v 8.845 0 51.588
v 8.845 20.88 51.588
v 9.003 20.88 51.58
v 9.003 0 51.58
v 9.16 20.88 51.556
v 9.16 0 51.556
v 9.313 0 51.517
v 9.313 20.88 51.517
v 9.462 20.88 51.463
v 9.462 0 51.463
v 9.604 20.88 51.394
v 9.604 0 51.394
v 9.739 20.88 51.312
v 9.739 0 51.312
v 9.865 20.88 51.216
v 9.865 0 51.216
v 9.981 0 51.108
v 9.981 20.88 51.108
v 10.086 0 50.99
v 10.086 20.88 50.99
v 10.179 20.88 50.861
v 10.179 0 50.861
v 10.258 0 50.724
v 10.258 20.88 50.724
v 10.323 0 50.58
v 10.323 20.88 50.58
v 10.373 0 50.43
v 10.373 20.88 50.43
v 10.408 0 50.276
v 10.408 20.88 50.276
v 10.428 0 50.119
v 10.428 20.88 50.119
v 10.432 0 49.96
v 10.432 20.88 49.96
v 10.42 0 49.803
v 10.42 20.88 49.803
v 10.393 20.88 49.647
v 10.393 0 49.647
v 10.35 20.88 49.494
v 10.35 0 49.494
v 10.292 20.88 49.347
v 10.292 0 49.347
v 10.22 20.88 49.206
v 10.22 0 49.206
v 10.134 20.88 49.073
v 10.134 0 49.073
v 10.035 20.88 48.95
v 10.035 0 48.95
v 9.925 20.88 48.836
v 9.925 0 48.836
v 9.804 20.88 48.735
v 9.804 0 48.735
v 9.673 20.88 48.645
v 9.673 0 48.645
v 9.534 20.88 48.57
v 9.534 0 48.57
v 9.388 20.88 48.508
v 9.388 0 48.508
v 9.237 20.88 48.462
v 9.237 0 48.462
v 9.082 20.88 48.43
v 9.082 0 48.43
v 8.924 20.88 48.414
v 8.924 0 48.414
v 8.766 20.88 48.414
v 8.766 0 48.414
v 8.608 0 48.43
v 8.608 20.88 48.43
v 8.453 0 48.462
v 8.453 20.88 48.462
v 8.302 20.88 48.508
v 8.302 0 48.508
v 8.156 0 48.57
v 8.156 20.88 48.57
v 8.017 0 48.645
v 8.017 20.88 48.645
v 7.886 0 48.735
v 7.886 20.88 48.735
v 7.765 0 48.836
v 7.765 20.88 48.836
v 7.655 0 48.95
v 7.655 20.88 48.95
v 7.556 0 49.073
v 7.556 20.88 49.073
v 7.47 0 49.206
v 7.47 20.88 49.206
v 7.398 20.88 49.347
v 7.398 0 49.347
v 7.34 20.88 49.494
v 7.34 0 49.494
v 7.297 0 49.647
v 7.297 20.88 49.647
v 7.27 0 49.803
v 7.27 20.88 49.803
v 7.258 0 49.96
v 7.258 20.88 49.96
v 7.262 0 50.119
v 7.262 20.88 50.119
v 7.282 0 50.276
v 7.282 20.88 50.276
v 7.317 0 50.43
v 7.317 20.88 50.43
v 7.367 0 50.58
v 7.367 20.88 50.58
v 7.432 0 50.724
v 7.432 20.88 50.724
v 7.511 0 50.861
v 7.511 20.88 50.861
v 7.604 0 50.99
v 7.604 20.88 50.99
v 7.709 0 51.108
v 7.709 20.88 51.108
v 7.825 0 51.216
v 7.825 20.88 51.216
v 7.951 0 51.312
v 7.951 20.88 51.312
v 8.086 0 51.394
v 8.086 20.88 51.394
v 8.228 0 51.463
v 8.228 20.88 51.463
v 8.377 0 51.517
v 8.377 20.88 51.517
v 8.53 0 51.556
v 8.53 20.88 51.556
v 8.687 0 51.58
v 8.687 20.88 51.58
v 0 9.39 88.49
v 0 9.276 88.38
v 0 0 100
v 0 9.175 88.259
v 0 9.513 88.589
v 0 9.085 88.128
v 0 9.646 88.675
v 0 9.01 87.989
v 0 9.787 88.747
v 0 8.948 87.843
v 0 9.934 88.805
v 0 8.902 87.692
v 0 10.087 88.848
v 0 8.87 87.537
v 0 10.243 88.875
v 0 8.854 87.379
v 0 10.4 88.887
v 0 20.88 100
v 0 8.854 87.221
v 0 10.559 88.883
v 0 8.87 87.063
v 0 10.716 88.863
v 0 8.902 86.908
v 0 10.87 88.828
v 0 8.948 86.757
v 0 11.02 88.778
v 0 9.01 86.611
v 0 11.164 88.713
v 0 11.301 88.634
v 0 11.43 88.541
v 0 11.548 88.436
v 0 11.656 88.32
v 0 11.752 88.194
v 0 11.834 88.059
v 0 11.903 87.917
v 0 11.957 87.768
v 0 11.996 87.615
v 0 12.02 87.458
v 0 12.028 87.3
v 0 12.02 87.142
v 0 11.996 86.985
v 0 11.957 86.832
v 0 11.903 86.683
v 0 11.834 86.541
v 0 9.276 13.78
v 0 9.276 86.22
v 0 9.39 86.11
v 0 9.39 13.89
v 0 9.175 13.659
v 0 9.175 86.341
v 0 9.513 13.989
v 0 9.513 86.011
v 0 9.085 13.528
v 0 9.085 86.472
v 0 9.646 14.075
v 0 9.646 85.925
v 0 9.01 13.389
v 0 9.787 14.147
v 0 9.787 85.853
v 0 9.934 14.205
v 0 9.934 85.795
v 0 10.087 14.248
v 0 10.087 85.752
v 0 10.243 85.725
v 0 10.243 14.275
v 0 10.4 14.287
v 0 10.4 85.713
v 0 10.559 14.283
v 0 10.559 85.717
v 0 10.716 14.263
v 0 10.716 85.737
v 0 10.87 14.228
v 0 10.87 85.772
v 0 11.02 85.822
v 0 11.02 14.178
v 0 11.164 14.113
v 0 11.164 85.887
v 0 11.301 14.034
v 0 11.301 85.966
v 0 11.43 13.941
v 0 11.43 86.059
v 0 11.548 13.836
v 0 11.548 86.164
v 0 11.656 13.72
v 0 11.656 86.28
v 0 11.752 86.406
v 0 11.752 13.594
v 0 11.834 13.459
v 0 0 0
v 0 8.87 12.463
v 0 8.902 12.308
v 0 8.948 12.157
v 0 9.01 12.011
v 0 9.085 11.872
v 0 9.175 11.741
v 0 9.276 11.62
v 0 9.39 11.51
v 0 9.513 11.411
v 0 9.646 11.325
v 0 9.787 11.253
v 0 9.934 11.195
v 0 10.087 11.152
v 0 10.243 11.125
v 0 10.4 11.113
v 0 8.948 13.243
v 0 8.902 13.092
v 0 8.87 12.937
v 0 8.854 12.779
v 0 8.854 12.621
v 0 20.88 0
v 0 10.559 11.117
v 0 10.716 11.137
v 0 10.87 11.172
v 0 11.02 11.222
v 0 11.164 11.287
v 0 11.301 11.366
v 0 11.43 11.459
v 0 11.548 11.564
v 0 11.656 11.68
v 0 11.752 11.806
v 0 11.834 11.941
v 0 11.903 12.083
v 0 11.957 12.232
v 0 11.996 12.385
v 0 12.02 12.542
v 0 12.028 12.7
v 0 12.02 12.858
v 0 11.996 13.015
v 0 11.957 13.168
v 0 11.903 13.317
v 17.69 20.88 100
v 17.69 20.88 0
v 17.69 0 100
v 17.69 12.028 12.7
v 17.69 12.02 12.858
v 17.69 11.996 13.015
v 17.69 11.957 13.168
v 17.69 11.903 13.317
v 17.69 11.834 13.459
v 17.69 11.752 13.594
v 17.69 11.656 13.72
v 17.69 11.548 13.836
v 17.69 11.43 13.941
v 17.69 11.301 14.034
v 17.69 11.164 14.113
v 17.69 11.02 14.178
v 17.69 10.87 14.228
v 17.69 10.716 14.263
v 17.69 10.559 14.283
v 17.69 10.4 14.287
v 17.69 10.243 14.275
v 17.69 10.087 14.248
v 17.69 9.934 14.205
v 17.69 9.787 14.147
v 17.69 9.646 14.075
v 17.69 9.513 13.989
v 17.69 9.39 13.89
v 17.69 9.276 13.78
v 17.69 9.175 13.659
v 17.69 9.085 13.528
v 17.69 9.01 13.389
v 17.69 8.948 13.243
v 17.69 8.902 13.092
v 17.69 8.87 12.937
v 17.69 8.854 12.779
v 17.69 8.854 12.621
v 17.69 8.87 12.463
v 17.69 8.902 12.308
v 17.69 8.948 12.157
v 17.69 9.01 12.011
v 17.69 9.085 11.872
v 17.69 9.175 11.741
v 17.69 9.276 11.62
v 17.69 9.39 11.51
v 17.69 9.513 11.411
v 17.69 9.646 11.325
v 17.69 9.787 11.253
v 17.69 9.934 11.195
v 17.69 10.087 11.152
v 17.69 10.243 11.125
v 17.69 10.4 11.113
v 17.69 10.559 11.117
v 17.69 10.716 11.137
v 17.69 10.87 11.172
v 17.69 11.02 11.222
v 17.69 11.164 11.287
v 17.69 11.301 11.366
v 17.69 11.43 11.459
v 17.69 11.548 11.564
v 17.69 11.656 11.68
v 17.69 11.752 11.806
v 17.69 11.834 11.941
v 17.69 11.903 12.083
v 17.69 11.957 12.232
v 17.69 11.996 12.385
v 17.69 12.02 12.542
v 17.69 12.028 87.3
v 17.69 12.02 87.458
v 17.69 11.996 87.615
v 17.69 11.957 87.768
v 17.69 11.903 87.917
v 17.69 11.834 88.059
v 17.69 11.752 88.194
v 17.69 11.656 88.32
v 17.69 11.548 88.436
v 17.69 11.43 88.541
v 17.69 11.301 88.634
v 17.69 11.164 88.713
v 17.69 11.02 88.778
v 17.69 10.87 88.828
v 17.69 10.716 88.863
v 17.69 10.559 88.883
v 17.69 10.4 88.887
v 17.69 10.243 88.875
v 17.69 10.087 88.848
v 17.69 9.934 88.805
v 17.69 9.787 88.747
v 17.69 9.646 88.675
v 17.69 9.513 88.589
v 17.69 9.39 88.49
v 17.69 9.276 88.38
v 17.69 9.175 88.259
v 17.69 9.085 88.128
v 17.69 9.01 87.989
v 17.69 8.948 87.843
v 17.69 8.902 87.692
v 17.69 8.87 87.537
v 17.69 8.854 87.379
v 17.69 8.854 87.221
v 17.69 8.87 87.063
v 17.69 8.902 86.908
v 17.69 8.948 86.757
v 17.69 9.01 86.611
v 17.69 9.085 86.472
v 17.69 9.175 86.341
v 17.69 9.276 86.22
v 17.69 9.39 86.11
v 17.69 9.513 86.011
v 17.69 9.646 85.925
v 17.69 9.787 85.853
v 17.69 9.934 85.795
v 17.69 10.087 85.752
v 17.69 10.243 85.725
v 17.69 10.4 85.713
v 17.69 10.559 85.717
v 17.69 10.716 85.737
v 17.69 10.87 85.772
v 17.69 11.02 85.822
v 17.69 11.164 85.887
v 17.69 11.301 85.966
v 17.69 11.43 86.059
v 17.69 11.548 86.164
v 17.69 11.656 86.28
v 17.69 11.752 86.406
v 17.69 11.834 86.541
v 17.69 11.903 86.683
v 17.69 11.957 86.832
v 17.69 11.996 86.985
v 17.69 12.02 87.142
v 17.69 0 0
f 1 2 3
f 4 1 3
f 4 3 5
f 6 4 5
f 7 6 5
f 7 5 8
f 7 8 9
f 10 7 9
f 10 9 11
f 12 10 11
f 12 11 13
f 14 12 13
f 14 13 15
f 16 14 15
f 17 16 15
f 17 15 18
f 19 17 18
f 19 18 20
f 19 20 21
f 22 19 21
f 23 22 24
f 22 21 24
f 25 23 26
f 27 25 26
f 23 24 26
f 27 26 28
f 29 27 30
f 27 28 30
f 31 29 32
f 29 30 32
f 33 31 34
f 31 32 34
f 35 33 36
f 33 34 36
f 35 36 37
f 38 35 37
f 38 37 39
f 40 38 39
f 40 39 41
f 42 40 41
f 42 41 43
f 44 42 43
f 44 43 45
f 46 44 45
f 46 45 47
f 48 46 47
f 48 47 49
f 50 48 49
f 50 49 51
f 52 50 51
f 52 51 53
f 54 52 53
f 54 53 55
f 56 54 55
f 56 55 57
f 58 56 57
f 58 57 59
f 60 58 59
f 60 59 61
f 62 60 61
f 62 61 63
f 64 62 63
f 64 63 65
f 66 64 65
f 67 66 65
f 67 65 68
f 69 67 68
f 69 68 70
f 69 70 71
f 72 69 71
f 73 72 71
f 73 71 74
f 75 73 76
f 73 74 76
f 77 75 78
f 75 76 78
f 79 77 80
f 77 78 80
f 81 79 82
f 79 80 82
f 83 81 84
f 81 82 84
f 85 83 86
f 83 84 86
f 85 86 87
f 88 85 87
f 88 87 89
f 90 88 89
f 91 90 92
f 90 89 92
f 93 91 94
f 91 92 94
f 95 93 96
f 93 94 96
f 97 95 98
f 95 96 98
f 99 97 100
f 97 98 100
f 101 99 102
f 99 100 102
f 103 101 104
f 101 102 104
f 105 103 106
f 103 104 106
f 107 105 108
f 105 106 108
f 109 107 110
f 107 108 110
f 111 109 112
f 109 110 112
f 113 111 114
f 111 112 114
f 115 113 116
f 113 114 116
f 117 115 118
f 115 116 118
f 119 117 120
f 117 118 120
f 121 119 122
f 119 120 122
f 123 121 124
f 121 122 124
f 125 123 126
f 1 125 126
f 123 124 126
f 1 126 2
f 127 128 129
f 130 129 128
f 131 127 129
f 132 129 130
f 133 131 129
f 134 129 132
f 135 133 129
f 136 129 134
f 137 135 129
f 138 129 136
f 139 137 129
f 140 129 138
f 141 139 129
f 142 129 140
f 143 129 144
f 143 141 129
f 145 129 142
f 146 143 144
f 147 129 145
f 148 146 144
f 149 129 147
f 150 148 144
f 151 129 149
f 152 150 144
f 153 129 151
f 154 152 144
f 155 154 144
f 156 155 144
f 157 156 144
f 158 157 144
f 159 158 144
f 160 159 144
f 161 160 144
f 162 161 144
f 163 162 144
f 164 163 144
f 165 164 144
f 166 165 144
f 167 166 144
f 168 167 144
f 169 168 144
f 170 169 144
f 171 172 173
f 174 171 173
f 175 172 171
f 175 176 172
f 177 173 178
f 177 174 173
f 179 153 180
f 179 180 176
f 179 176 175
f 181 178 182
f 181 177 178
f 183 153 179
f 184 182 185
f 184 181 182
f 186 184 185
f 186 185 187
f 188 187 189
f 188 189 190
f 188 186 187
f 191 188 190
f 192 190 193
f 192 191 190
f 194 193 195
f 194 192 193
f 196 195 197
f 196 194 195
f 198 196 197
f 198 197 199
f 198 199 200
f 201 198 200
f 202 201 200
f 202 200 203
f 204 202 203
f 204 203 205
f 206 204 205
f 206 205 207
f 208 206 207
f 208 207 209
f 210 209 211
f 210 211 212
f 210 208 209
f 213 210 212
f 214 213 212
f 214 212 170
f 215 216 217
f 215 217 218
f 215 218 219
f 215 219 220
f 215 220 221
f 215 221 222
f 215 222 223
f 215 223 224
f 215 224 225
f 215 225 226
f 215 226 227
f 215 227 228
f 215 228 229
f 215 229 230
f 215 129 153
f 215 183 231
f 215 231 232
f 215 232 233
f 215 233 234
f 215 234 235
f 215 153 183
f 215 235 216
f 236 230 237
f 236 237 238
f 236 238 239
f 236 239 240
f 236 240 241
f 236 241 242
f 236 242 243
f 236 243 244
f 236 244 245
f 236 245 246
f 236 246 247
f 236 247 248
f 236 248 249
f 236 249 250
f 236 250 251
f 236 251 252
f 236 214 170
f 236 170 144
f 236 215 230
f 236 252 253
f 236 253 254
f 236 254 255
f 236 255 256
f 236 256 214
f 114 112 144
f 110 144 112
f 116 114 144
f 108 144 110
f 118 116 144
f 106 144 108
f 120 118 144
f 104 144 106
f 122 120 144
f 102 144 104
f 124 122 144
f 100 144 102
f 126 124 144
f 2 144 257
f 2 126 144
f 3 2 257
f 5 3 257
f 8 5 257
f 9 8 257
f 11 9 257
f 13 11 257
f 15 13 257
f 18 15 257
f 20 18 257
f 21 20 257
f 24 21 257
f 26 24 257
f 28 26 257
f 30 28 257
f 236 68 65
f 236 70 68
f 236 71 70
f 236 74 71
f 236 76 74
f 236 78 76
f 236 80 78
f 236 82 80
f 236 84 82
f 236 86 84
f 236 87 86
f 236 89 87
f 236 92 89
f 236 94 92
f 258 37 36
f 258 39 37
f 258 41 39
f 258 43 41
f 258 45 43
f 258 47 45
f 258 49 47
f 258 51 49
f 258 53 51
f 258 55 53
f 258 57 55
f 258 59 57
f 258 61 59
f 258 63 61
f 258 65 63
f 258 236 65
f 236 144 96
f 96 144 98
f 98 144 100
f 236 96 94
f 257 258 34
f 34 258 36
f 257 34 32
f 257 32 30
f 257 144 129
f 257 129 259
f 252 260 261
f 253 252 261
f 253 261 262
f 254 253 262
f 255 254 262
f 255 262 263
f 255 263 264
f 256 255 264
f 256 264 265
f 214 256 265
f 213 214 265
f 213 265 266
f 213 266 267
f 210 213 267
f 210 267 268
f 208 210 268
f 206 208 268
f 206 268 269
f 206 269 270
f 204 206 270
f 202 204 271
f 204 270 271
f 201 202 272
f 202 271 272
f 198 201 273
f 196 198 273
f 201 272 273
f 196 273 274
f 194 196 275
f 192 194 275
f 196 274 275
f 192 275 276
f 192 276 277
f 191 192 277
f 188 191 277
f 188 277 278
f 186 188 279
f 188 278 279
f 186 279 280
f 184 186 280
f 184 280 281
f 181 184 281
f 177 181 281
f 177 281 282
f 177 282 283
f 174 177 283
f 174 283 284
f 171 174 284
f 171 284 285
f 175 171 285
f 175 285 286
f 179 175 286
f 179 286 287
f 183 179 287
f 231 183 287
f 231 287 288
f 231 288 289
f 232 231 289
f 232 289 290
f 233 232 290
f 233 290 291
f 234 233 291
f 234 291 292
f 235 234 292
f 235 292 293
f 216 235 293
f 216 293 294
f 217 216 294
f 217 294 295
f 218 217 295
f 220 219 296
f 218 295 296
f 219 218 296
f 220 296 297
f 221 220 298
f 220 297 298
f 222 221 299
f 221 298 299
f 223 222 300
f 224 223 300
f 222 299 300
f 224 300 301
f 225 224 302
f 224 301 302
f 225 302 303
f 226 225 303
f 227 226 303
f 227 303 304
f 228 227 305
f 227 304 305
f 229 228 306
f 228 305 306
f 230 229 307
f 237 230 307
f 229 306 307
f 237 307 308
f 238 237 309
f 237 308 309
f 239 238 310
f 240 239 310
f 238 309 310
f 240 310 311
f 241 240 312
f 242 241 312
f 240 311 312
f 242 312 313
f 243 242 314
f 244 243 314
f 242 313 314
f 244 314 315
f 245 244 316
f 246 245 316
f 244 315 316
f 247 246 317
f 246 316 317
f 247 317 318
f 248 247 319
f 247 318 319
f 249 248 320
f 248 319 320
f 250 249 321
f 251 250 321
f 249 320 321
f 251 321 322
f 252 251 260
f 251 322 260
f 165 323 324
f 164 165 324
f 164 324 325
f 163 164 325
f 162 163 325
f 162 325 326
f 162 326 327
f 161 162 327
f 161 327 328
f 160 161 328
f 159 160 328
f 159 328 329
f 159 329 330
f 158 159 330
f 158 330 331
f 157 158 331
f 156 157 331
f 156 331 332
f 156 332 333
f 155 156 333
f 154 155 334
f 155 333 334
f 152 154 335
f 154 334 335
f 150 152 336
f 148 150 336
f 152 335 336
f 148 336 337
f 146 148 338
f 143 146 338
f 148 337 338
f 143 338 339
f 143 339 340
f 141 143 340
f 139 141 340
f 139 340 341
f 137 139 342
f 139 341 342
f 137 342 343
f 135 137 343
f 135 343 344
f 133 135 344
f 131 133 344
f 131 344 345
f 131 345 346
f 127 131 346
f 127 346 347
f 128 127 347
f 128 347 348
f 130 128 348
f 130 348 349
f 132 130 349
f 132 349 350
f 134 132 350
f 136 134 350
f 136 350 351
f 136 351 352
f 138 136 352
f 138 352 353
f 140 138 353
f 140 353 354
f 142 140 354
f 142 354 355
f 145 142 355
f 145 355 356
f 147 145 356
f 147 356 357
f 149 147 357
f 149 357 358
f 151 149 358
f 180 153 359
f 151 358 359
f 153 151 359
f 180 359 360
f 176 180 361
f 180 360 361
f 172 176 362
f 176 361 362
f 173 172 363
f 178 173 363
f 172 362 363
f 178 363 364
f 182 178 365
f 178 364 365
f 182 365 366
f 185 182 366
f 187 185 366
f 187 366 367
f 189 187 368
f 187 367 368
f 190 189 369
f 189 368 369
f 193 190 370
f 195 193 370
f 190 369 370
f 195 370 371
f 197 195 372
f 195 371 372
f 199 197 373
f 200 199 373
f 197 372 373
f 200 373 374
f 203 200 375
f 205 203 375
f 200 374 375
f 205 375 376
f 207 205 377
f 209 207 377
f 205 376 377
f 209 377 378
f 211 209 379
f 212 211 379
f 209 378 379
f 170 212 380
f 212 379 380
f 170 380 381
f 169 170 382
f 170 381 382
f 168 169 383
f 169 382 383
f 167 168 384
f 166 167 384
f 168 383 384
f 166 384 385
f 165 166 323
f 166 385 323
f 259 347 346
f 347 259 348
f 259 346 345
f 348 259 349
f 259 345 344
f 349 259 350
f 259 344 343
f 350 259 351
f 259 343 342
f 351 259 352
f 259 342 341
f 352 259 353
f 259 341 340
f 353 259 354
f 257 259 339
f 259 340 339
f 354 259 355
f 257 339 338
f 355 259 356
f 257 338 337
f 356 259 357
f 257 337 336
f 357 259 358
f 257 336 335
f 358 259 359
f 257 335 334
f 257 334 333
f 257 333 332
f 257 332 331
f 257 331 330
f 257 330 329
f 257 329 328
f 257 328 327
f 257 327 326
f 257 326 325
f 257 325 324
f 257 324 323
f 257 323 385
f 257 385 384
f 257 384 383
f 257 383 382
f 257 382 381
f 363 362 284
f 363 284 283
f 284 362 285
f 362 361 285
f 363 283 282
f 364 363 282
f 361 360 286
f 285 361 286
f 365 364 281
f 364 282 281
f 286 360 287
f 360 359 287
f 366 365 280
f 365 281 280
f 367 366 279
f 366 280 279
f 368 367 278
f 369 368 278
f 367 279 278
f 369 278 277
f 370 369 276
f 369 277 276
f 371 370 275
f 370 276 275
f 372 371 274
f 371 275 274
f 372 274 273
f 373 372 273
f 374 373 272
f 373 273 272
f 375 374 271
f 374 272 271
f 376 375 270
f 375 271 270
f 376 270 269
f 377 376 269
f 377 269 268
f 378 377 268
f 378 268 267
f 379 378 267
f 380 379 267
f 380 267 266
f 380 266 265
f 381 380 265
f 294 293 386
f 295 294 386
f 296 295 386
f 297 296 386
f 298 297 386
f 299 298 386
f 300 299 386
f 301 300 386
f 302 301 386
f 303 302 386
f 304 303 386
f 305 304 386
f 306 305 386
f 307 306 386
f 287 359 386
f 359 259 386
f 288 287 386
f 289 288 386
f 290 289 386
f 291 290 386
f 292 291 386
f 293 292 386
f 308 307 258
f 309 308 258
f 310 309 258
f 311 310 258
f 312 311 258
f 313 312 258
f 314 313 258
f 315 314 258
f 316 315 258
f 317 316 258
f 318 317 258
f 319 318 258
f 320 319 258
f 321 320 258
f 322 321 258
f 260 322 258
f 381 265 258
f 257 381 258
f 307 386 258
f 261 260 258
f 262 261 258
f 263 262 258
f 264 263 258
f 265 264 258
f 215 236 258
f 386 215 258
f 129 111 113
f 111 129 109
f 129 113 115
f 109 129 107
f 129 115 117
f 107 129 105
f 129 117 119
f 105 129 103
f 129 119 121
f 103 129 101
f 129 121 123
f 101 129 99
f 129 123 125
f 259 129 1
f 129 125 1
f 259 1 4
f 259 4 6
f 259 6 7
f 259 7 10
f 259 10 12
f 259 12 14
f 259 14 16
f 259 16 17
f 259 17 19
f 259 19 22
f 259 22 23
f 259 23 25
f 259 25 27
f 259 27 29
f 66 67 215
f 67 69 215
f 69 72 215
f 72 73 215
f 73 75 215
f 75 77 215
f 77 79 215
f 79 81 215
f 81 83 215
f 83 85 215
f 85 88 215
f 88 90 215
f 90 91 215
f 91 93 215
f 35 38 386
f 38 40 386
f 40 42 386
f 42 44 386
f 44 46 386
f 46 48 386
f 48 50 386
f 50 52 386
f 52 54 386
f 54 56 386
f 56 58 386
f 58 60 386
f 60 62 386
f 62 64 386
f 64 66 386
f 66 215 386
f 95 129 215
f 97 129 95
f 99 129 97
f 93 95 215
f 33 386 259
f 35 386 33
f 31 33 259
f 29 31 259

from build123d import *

# Parameters (mm, degrees)
SKETCH1_W           = 17.69
SKETCH1_H           = 20.88
BOSS_EXTRUDE1_DEPTH = 100
SKETCH2_R           = 1.5875
CUT_EXTRUDE1_DEPTH  = 106.78
SKETCH3_R           = 1.5875
CUT_EXTRUDE2_DEPTH  = 100


with BuildPart() as part:
    # Sketch1 → Boss-Extrude1 (new body)
    with BuildSketch(Plane.XY):
        with Locations((8.845, 10.44)):
            Rectangle(SKETCH1_W, SKETCH1_H)
    extrude(amount=BOSS_EXTRUDE1_DEPTH)

    # Sketch2 → Cut-Extrude1 (cut)
    with BuildSketch(Plane(origin=(0, 20.88, 0), x_dir=(1, 0, 0), z_dir=(0, 1, 0))):
        with Locations(Location((8.845, -50, 0), (0, 0, 270))):
            Circle(SKETCH2_R)
    extrude(amount=-CUT_EXTRUDE1_DEPTH, mode=Mode.SUBTRACT)

    # Sketch3 → Cut-Extrude2 (cut)
    with BuildSketch(Plane(origin=(17.69, 0, 0), x_dir=(0, 0, -1), z_dir=(1, 0, 0))):
        with Locations(Location((-87.3, 10.44, 0), (0, 0, 90))):
            Circle(SKETCH3_R)
        with Locations(Location((-12.7, 10.44, 0), (0, 0, 90))):
            Circle(SKETCH3_R)
    extrude(amount=-CUT_EXTRUDE2_DEPTH, mode=Mode.SUBTRACT)


solid = part.part
